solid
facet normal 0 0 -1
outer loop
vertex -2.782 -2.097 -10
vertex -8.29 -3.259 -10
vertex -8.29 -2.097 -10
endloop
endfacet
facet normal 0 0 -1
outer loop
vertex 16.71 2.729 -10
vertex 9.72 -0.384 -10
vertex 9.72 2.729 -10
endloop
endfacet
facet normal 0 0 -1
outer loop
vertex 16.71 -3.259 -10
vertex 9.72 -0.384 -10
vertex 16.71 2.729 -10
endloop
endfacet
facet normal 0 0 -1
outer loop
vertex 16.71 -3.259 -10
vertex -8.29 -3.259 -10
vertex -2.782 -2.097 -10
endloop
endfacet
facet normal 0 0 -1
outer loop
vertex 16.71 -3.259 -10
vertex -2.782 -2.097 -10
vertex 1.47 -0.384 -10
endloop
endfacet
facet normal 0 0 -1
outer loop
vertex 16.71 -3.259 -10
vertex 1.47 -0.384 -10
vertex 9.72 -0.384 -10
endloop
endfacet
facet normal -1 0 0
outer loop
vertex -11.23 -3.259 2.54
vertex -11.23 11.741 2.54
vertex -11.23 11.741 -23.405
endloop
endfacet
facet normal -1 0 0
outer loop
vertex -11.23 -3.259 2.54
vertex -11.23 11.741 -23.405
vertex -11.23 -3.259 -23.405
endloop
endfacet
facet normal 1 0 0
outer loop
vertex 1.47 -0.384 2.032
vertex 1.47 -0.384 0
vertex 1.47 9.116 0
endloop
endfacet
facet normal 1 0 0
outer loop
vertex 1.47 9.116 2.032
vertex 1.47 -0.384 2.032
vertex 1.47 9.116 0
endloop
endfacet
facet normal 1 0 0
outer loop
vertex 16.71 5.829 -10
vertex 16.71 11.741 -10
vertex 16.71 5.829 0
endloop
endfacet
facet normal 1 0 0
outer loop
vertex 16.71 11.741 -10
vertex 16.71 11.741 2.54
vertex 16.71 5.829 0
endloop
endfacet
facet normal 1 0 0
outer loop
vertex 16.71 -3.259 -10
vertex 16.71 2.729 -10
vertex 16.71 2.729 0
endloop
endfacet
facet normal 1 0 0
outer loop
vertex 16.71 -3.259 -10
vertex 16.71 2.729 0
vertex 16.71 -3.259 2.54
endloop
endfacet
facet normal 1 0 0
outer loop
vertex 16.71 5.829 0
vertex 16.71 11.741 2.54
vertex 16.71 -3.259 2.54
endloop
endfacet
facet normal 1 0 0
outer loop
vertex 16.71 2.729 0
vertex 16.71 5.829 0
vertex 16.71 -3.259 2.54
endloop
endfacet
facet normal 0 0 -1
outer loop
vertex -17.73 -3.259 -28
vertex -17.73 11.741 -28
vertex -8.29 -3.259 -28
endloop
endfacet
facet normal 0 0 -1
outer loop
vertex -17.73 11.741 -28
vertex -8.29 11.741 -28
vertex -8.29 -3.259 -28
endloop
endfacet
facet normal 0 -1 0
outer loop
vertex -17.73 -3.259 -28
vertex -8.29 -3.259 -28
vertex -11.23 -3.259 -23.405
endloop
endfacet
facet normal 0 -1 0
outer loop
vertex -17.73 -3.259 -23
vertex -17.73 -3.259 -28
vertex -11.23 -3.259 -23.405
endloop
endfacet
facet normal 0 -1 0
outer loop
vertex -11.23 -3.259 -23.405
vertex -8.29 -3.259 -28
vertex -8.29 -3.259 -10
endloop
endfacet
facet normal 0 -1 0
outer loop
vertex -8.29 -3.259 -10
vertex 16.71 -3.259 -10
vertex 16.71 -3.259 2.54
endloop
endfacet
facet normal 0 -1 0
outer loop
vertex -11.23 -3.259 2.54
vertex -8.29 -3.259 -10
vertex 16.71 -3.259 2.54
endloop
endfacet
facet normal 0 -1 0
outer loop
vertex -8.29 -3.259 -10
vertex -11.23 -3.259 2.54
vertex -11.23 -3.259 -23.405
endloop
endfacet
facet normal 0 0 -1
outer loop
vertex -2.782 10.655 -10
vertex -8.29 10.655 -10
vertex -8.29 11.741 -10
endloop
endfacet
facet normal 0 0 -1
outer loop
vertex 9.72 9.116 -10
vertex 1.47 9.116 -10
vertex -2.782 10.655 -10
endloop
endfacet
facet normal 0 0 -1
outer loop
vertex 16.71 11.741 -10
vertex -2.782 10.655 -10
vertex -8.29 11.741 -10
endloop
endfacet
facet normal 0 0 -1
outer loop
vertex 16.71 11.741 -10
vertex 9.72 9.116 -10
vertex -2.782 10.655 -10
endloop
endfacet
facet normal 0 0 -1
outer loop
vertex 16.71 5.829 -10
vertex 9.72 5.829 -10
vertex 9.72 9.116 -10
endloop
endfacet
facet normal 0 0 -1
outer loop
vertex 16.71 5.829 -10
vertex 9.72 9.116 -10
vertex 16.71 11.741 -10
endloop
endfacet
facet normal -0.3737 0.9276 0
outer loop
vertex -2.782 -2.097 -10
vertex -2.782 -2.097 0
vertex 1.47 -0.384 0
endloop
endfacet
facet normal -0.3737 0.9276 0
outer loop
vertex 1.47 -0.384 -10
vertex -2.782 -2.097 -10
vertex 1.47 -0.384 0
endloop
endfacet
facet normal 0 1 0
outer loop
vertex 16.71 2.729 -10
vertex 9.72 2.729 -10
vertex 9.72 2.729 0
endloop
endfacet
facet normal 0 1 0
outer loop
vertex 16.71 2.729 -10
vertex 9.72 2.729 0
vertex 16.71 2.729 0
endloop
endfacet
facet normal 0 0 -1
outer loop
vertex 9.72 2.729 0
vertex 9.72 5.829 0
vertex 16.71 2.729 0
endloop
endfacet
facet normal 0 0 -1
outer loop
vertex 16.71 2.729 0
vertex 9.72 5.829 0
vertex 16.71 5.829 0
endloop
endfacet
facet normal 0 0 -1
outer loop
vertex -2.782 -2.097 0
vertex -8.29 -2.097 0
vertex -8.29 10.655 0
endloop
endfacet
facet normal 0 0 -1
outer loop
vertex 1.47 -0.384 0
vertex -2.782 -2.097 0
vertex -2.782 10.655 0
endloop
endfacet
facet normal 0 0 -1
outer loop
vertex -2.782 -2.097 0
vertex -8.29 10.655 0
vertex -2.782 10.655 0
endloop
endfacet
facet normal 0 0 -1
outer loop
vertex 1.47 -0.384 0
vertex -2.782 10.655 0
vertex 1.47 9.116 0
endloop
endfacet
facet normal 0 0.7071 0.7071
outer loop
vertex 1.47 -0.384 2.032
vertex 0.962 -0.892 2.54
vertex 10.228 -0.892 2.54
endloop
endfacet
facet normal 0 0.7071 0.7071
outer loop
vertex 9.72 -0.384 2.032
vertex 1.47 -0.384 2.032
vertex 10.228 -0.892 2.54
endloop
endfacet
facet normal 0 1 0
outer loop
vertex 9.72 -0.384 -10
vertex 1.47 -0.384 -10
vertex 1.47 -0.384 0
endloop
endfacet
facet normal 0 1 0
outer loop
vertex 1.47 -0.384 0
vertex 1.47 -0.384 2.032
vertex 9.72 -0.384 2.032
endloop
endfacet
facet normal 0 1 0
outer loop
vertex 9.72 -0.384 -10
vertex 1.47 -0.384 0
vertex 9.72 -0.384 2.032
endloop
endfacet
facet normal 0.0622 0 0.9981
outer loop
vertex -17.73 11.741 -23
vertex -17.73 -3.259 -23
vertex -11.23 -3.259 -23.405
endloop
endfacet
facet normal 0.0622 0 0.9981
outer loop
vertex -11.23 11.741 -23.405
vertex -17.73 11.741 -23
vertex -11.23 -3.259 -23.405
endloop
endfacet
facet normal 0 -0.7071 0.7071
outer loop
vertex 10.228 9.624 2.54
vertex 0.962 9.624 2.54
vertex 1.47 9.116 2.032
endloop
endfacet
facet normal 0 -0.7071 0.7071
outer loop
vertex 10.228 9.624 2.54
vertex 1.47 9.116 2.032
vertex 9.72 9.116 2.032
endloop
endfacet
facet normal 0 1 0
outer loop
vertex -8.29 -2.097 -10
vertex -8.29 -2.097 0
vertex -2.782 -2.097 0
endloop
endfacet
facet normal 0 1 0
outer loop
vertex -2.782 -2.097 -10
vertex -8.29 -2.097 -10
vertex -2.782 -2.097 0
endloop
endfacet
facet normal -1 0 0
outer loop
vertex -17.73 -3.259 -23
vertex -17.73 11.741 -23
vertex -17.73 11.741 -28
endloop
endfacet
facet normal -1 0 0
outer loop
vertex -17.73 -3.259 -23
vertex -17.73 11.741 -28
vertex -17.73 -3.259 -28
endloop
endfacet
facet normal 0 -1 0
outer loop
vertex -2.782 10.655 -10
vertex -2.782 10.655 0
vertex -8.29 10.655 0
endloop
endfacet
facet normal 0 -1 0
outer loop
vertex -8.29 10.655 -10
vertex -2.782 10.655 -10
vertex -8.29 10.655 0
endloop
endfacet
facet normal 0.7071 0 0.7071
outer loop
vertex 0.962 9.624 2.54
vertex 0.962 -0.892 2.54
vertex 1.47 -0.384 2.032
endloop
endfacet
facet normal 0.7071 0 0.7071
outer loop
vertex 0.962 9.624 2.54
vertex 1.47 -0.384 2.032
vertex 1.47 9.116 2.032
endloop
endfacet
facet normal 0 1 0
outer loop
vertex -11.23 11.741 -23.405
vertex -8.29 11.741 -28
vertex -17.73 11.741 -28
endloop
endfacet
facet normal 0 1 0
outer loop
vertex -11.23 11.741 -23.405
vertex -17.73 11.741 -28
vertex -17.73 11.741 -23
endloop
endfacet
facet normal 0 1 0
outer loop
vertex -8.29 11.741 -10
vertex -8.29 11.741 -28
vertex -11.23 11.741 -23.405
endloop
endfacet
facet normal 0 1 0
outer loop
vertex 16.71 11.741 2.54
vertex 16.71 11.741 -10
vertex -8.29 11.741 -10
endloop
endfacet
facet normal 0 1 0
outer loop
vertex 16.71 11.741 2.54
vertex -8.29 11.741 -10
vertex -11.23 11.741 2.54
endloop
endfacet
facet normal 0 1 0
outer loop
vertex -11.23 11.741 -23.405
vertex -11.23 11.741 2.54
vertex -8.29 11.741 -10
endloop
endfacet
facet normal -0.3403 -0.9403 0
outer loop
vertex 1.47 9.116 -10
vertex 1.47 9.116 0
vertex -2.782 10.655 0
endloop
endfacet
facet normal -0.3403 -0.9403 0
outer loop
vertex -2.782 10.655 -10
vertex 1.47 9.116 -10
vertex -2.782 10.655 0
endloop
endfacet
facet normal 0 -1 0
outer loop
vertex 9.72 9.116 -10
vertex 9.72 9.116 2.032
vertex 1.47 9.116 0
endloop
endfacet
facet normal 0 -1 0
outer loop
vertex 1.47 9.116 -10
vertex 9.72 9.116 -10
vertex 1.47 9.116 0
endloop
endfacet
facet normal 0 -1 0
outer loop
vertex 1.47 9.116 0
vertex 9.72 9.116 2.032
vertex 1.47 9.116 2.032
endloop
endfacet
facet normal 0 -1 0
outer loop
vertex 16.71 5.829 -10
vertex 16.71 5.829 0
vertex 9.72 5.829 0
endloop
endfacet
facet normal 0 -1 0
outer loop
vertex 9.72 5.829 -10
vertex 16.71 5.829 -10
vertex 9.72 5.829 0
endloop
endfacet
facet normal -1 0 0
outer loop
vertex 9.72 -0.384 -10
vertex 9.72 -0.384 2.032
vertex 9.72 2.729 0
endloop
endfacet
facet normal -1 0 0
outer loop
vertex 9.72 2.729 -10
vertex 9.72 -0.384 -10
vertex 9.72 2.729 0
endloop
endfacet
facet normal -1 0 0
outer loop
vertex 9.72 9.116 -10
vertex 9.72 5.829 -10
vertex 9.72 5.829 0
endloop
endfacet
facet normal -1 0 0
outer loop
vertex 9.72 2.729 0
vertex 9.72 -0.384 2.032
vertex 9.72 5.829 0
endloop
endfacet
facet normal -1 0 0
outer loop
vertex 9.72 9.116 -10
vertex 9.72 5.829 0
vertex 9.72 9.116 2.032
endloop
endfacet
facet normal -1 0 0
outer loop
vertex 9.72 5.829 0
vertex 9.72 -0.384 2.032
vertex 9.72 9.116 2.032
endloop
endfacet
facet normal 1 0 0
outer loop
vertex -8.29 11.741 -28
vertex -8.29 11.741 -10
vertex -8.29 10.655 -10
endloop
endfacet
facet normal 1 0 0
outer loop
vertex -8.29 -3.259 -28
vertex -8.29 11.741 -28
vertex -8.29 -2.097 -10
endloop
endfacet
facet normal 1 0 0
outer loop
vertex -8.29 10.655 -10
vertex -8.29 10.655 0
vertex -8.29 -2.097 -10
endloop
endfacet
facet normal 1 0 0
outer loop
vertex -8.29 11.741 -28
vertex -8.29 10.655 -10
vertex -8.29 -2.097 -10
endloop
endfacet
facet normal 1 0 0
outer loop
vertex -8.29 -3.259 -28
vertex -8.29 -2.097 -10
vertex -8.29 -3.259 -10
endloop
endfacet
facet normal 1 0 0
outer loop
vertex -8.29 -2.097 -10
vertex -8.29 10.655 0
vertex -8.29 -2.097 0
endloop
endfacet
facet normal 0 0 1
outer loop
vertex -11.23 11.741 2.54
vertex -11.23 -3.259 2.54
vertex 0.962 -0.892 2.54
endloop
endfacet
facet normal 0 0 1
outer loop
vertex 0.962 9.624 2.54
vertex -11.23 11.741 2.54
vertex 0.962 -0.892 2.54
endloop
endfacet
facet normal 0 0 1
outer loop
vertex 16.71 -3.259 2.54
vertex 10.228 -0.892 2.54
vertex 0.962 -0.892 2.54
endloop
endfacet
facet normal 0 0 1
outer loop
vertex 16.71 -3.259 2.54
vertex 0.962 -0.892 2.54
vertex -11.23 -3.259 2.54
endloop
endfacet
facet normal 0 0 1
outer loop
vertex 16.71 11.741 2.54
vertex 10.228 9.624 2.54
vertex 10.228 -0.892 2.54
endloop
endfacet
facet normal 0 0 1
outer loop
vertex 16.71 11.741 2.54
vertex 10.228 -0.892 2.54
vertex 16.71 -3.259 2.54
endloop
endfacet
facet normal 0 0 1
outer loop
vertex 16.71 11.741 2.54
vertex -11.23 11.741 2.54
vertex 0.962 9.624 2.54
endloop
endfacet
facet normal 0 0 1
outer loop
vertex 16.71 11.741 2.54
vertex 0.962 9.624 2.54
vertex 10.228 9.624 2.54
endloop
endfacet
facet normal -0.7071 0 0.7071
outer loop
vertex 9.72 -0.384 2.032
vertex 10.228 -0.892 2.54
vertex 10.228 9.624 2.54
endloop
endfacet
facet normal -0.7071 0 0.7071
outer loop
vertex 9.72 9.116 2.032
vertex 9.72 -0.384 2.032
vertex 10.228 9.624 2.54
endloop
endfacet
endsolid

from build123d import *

# Parameters (mm, degrees)
F0_W     = 27.94
F0_H     = 15
F0_W_2   = 8.25
F0_H_2   = 9.5
F1_DEPTH = 2.54
F2_W     = 1.7651973286
F2_H     = 4.826
F2_W_2   = 1.3194764033
F3_DEPTH = 10
F4_W     = 2.94
F4_H     = 15
F5_DEPTH = 18
F6_W     = 15
F6_H     = 5
F7_DEPTH = 6.5
F9_DEPTH = 25.4
F10_SIZE = 0.508


# Not quite as in the source:
# - a feature names something its author has since deleted; it is built from what else it names


with BuildPart() as f1:
    # F0 (on Top) → F1 (new body)
    with BuildSketch(Plane.XY):
        with Locations((2.7402517554, 4.2405291848)):
            Rectangle(F0_W, F0_H)
        with Locations((5.5952517554, 4.3655291848)):
            Rectangle(F0_W_2, F0_H_2, mode=Mode.SUBTRACT)
    extrude(amount=F1_DEPTH)

    # F2 (on face) → F3 (join)
    with BuildSketch(Plane(origin=(0, 0, 0), x_dir=(1, 0, 0), z_dir=(0, 0, -1))):
        Polygon((-11.2297482446, -11.7405291848), (16.7102517554, -11.7405291848), (16.7102517554, -10.6549952576), (14.9450544268, -10.6549952576), (13.6255780235, -10.6549952576), (-2.7816970833, -10.6549952576), (-8.2897482446, -10.6549952576), (-11.2297482446, -10.6549952576), align=None)
        with Locations((15.8276530911, -8.2419952576)):
            Rectangle(F2_W, F2_H)
        with Locations((15.8276530911, -0.3159952576)):
            Rectangle(F2_W, F2_H)
        Polygon((-2.7816970833, -10.6549952576), (13.6255780235, -10.6549952576), (13.6255780235, -5.8289952576), (9.7202517554, -5.8289952576), (9.7202517554, -9.1155291848), (1.4702517554, -9.1155291848), align=None)
        Polygon((-8.2897482446, 3.2594708152), (-8.2897482446, 2.0970047424), (-2.7816970833, 2.0970047424), (13.6255780235, 2.0970047424), (14.9450544268, 2.0970047424), (16.7102517554, 2.0970047424), (16.7102517554, 3.2594708152), align=None)
        Polygon((13.6255780235, 2.0970047424), (-2.7816970833, 2.0970047424), (1.4702517554, 0.3844708152), (9.7202517554, 0.3844708152), (9.7202517554, -2.7289952576), (13.6255780235, -2.7289952576), align=None)
        with Locations((14.2853162251, -8.2419952576)):
            Rectangle(F2_W_2, F2_H)
        with Locations((14.2853162251, -0.3159952576)):
            Rectangle(F2_W_2, F2_H)
        Polygon((-11.2297482446, 3.2594708152), (-11.2297482446, -10.6549952576), (-8.2897482446, -10.6549952576), (-8.2897482446, 2.0970047424), (-8.2897482446, 3.2594708152), align=None)
    extrude(amount=F3_DEPTH)

    # F4 (on face) → F5 (join)
    with BuildSketch(Plane(origin=(0, 0, -10), x_dir=(1, 0, 0), z_dir=(0, 0, -1))):
        with Locations((-9.7597482446, -4.2405291848)):
            Rectangle(F4_W, F4_H)
    extrude(amount=F5_DEPTH)

    # F6 (on face) → F7 (join)
    with BuildSketch(Plane(origin=(-11.2297482446, 0, 0), x_dir=(0, -1, 0), z_dir=(-1, 0, 0))):
        with Locations((-4.2405291848, -25.5)):
            Rectangle(F6_W, F6_H)
    extrude(amount=F7_DEPTH)

    # F8 (on face) → F9 (cut)
    with BuildSketch(Plane.XZ.offset(3.2594708152)):
        Polygon((-11.2297482446, -23), (-17.7297482446, -23), (-11.2297482446, -23.4054420143), align=None)
    extrude(amount=-F9_DEPTH, mode=Mode.SUBTRACT)

    # F10
    f10_edges = [f1.edges().sort_by_distance(p)[0] for p in [
        (1.470252, 4.365529, 2.54),
        (5.595252, 9.115529, 2.54),
        (9.720252, 4.365529, 2.54),
        (5.595252, -0.384471, 2.54),
    ]]
    chamfer(f10_edges, length=F10_SIZE)


solid = f1.part
